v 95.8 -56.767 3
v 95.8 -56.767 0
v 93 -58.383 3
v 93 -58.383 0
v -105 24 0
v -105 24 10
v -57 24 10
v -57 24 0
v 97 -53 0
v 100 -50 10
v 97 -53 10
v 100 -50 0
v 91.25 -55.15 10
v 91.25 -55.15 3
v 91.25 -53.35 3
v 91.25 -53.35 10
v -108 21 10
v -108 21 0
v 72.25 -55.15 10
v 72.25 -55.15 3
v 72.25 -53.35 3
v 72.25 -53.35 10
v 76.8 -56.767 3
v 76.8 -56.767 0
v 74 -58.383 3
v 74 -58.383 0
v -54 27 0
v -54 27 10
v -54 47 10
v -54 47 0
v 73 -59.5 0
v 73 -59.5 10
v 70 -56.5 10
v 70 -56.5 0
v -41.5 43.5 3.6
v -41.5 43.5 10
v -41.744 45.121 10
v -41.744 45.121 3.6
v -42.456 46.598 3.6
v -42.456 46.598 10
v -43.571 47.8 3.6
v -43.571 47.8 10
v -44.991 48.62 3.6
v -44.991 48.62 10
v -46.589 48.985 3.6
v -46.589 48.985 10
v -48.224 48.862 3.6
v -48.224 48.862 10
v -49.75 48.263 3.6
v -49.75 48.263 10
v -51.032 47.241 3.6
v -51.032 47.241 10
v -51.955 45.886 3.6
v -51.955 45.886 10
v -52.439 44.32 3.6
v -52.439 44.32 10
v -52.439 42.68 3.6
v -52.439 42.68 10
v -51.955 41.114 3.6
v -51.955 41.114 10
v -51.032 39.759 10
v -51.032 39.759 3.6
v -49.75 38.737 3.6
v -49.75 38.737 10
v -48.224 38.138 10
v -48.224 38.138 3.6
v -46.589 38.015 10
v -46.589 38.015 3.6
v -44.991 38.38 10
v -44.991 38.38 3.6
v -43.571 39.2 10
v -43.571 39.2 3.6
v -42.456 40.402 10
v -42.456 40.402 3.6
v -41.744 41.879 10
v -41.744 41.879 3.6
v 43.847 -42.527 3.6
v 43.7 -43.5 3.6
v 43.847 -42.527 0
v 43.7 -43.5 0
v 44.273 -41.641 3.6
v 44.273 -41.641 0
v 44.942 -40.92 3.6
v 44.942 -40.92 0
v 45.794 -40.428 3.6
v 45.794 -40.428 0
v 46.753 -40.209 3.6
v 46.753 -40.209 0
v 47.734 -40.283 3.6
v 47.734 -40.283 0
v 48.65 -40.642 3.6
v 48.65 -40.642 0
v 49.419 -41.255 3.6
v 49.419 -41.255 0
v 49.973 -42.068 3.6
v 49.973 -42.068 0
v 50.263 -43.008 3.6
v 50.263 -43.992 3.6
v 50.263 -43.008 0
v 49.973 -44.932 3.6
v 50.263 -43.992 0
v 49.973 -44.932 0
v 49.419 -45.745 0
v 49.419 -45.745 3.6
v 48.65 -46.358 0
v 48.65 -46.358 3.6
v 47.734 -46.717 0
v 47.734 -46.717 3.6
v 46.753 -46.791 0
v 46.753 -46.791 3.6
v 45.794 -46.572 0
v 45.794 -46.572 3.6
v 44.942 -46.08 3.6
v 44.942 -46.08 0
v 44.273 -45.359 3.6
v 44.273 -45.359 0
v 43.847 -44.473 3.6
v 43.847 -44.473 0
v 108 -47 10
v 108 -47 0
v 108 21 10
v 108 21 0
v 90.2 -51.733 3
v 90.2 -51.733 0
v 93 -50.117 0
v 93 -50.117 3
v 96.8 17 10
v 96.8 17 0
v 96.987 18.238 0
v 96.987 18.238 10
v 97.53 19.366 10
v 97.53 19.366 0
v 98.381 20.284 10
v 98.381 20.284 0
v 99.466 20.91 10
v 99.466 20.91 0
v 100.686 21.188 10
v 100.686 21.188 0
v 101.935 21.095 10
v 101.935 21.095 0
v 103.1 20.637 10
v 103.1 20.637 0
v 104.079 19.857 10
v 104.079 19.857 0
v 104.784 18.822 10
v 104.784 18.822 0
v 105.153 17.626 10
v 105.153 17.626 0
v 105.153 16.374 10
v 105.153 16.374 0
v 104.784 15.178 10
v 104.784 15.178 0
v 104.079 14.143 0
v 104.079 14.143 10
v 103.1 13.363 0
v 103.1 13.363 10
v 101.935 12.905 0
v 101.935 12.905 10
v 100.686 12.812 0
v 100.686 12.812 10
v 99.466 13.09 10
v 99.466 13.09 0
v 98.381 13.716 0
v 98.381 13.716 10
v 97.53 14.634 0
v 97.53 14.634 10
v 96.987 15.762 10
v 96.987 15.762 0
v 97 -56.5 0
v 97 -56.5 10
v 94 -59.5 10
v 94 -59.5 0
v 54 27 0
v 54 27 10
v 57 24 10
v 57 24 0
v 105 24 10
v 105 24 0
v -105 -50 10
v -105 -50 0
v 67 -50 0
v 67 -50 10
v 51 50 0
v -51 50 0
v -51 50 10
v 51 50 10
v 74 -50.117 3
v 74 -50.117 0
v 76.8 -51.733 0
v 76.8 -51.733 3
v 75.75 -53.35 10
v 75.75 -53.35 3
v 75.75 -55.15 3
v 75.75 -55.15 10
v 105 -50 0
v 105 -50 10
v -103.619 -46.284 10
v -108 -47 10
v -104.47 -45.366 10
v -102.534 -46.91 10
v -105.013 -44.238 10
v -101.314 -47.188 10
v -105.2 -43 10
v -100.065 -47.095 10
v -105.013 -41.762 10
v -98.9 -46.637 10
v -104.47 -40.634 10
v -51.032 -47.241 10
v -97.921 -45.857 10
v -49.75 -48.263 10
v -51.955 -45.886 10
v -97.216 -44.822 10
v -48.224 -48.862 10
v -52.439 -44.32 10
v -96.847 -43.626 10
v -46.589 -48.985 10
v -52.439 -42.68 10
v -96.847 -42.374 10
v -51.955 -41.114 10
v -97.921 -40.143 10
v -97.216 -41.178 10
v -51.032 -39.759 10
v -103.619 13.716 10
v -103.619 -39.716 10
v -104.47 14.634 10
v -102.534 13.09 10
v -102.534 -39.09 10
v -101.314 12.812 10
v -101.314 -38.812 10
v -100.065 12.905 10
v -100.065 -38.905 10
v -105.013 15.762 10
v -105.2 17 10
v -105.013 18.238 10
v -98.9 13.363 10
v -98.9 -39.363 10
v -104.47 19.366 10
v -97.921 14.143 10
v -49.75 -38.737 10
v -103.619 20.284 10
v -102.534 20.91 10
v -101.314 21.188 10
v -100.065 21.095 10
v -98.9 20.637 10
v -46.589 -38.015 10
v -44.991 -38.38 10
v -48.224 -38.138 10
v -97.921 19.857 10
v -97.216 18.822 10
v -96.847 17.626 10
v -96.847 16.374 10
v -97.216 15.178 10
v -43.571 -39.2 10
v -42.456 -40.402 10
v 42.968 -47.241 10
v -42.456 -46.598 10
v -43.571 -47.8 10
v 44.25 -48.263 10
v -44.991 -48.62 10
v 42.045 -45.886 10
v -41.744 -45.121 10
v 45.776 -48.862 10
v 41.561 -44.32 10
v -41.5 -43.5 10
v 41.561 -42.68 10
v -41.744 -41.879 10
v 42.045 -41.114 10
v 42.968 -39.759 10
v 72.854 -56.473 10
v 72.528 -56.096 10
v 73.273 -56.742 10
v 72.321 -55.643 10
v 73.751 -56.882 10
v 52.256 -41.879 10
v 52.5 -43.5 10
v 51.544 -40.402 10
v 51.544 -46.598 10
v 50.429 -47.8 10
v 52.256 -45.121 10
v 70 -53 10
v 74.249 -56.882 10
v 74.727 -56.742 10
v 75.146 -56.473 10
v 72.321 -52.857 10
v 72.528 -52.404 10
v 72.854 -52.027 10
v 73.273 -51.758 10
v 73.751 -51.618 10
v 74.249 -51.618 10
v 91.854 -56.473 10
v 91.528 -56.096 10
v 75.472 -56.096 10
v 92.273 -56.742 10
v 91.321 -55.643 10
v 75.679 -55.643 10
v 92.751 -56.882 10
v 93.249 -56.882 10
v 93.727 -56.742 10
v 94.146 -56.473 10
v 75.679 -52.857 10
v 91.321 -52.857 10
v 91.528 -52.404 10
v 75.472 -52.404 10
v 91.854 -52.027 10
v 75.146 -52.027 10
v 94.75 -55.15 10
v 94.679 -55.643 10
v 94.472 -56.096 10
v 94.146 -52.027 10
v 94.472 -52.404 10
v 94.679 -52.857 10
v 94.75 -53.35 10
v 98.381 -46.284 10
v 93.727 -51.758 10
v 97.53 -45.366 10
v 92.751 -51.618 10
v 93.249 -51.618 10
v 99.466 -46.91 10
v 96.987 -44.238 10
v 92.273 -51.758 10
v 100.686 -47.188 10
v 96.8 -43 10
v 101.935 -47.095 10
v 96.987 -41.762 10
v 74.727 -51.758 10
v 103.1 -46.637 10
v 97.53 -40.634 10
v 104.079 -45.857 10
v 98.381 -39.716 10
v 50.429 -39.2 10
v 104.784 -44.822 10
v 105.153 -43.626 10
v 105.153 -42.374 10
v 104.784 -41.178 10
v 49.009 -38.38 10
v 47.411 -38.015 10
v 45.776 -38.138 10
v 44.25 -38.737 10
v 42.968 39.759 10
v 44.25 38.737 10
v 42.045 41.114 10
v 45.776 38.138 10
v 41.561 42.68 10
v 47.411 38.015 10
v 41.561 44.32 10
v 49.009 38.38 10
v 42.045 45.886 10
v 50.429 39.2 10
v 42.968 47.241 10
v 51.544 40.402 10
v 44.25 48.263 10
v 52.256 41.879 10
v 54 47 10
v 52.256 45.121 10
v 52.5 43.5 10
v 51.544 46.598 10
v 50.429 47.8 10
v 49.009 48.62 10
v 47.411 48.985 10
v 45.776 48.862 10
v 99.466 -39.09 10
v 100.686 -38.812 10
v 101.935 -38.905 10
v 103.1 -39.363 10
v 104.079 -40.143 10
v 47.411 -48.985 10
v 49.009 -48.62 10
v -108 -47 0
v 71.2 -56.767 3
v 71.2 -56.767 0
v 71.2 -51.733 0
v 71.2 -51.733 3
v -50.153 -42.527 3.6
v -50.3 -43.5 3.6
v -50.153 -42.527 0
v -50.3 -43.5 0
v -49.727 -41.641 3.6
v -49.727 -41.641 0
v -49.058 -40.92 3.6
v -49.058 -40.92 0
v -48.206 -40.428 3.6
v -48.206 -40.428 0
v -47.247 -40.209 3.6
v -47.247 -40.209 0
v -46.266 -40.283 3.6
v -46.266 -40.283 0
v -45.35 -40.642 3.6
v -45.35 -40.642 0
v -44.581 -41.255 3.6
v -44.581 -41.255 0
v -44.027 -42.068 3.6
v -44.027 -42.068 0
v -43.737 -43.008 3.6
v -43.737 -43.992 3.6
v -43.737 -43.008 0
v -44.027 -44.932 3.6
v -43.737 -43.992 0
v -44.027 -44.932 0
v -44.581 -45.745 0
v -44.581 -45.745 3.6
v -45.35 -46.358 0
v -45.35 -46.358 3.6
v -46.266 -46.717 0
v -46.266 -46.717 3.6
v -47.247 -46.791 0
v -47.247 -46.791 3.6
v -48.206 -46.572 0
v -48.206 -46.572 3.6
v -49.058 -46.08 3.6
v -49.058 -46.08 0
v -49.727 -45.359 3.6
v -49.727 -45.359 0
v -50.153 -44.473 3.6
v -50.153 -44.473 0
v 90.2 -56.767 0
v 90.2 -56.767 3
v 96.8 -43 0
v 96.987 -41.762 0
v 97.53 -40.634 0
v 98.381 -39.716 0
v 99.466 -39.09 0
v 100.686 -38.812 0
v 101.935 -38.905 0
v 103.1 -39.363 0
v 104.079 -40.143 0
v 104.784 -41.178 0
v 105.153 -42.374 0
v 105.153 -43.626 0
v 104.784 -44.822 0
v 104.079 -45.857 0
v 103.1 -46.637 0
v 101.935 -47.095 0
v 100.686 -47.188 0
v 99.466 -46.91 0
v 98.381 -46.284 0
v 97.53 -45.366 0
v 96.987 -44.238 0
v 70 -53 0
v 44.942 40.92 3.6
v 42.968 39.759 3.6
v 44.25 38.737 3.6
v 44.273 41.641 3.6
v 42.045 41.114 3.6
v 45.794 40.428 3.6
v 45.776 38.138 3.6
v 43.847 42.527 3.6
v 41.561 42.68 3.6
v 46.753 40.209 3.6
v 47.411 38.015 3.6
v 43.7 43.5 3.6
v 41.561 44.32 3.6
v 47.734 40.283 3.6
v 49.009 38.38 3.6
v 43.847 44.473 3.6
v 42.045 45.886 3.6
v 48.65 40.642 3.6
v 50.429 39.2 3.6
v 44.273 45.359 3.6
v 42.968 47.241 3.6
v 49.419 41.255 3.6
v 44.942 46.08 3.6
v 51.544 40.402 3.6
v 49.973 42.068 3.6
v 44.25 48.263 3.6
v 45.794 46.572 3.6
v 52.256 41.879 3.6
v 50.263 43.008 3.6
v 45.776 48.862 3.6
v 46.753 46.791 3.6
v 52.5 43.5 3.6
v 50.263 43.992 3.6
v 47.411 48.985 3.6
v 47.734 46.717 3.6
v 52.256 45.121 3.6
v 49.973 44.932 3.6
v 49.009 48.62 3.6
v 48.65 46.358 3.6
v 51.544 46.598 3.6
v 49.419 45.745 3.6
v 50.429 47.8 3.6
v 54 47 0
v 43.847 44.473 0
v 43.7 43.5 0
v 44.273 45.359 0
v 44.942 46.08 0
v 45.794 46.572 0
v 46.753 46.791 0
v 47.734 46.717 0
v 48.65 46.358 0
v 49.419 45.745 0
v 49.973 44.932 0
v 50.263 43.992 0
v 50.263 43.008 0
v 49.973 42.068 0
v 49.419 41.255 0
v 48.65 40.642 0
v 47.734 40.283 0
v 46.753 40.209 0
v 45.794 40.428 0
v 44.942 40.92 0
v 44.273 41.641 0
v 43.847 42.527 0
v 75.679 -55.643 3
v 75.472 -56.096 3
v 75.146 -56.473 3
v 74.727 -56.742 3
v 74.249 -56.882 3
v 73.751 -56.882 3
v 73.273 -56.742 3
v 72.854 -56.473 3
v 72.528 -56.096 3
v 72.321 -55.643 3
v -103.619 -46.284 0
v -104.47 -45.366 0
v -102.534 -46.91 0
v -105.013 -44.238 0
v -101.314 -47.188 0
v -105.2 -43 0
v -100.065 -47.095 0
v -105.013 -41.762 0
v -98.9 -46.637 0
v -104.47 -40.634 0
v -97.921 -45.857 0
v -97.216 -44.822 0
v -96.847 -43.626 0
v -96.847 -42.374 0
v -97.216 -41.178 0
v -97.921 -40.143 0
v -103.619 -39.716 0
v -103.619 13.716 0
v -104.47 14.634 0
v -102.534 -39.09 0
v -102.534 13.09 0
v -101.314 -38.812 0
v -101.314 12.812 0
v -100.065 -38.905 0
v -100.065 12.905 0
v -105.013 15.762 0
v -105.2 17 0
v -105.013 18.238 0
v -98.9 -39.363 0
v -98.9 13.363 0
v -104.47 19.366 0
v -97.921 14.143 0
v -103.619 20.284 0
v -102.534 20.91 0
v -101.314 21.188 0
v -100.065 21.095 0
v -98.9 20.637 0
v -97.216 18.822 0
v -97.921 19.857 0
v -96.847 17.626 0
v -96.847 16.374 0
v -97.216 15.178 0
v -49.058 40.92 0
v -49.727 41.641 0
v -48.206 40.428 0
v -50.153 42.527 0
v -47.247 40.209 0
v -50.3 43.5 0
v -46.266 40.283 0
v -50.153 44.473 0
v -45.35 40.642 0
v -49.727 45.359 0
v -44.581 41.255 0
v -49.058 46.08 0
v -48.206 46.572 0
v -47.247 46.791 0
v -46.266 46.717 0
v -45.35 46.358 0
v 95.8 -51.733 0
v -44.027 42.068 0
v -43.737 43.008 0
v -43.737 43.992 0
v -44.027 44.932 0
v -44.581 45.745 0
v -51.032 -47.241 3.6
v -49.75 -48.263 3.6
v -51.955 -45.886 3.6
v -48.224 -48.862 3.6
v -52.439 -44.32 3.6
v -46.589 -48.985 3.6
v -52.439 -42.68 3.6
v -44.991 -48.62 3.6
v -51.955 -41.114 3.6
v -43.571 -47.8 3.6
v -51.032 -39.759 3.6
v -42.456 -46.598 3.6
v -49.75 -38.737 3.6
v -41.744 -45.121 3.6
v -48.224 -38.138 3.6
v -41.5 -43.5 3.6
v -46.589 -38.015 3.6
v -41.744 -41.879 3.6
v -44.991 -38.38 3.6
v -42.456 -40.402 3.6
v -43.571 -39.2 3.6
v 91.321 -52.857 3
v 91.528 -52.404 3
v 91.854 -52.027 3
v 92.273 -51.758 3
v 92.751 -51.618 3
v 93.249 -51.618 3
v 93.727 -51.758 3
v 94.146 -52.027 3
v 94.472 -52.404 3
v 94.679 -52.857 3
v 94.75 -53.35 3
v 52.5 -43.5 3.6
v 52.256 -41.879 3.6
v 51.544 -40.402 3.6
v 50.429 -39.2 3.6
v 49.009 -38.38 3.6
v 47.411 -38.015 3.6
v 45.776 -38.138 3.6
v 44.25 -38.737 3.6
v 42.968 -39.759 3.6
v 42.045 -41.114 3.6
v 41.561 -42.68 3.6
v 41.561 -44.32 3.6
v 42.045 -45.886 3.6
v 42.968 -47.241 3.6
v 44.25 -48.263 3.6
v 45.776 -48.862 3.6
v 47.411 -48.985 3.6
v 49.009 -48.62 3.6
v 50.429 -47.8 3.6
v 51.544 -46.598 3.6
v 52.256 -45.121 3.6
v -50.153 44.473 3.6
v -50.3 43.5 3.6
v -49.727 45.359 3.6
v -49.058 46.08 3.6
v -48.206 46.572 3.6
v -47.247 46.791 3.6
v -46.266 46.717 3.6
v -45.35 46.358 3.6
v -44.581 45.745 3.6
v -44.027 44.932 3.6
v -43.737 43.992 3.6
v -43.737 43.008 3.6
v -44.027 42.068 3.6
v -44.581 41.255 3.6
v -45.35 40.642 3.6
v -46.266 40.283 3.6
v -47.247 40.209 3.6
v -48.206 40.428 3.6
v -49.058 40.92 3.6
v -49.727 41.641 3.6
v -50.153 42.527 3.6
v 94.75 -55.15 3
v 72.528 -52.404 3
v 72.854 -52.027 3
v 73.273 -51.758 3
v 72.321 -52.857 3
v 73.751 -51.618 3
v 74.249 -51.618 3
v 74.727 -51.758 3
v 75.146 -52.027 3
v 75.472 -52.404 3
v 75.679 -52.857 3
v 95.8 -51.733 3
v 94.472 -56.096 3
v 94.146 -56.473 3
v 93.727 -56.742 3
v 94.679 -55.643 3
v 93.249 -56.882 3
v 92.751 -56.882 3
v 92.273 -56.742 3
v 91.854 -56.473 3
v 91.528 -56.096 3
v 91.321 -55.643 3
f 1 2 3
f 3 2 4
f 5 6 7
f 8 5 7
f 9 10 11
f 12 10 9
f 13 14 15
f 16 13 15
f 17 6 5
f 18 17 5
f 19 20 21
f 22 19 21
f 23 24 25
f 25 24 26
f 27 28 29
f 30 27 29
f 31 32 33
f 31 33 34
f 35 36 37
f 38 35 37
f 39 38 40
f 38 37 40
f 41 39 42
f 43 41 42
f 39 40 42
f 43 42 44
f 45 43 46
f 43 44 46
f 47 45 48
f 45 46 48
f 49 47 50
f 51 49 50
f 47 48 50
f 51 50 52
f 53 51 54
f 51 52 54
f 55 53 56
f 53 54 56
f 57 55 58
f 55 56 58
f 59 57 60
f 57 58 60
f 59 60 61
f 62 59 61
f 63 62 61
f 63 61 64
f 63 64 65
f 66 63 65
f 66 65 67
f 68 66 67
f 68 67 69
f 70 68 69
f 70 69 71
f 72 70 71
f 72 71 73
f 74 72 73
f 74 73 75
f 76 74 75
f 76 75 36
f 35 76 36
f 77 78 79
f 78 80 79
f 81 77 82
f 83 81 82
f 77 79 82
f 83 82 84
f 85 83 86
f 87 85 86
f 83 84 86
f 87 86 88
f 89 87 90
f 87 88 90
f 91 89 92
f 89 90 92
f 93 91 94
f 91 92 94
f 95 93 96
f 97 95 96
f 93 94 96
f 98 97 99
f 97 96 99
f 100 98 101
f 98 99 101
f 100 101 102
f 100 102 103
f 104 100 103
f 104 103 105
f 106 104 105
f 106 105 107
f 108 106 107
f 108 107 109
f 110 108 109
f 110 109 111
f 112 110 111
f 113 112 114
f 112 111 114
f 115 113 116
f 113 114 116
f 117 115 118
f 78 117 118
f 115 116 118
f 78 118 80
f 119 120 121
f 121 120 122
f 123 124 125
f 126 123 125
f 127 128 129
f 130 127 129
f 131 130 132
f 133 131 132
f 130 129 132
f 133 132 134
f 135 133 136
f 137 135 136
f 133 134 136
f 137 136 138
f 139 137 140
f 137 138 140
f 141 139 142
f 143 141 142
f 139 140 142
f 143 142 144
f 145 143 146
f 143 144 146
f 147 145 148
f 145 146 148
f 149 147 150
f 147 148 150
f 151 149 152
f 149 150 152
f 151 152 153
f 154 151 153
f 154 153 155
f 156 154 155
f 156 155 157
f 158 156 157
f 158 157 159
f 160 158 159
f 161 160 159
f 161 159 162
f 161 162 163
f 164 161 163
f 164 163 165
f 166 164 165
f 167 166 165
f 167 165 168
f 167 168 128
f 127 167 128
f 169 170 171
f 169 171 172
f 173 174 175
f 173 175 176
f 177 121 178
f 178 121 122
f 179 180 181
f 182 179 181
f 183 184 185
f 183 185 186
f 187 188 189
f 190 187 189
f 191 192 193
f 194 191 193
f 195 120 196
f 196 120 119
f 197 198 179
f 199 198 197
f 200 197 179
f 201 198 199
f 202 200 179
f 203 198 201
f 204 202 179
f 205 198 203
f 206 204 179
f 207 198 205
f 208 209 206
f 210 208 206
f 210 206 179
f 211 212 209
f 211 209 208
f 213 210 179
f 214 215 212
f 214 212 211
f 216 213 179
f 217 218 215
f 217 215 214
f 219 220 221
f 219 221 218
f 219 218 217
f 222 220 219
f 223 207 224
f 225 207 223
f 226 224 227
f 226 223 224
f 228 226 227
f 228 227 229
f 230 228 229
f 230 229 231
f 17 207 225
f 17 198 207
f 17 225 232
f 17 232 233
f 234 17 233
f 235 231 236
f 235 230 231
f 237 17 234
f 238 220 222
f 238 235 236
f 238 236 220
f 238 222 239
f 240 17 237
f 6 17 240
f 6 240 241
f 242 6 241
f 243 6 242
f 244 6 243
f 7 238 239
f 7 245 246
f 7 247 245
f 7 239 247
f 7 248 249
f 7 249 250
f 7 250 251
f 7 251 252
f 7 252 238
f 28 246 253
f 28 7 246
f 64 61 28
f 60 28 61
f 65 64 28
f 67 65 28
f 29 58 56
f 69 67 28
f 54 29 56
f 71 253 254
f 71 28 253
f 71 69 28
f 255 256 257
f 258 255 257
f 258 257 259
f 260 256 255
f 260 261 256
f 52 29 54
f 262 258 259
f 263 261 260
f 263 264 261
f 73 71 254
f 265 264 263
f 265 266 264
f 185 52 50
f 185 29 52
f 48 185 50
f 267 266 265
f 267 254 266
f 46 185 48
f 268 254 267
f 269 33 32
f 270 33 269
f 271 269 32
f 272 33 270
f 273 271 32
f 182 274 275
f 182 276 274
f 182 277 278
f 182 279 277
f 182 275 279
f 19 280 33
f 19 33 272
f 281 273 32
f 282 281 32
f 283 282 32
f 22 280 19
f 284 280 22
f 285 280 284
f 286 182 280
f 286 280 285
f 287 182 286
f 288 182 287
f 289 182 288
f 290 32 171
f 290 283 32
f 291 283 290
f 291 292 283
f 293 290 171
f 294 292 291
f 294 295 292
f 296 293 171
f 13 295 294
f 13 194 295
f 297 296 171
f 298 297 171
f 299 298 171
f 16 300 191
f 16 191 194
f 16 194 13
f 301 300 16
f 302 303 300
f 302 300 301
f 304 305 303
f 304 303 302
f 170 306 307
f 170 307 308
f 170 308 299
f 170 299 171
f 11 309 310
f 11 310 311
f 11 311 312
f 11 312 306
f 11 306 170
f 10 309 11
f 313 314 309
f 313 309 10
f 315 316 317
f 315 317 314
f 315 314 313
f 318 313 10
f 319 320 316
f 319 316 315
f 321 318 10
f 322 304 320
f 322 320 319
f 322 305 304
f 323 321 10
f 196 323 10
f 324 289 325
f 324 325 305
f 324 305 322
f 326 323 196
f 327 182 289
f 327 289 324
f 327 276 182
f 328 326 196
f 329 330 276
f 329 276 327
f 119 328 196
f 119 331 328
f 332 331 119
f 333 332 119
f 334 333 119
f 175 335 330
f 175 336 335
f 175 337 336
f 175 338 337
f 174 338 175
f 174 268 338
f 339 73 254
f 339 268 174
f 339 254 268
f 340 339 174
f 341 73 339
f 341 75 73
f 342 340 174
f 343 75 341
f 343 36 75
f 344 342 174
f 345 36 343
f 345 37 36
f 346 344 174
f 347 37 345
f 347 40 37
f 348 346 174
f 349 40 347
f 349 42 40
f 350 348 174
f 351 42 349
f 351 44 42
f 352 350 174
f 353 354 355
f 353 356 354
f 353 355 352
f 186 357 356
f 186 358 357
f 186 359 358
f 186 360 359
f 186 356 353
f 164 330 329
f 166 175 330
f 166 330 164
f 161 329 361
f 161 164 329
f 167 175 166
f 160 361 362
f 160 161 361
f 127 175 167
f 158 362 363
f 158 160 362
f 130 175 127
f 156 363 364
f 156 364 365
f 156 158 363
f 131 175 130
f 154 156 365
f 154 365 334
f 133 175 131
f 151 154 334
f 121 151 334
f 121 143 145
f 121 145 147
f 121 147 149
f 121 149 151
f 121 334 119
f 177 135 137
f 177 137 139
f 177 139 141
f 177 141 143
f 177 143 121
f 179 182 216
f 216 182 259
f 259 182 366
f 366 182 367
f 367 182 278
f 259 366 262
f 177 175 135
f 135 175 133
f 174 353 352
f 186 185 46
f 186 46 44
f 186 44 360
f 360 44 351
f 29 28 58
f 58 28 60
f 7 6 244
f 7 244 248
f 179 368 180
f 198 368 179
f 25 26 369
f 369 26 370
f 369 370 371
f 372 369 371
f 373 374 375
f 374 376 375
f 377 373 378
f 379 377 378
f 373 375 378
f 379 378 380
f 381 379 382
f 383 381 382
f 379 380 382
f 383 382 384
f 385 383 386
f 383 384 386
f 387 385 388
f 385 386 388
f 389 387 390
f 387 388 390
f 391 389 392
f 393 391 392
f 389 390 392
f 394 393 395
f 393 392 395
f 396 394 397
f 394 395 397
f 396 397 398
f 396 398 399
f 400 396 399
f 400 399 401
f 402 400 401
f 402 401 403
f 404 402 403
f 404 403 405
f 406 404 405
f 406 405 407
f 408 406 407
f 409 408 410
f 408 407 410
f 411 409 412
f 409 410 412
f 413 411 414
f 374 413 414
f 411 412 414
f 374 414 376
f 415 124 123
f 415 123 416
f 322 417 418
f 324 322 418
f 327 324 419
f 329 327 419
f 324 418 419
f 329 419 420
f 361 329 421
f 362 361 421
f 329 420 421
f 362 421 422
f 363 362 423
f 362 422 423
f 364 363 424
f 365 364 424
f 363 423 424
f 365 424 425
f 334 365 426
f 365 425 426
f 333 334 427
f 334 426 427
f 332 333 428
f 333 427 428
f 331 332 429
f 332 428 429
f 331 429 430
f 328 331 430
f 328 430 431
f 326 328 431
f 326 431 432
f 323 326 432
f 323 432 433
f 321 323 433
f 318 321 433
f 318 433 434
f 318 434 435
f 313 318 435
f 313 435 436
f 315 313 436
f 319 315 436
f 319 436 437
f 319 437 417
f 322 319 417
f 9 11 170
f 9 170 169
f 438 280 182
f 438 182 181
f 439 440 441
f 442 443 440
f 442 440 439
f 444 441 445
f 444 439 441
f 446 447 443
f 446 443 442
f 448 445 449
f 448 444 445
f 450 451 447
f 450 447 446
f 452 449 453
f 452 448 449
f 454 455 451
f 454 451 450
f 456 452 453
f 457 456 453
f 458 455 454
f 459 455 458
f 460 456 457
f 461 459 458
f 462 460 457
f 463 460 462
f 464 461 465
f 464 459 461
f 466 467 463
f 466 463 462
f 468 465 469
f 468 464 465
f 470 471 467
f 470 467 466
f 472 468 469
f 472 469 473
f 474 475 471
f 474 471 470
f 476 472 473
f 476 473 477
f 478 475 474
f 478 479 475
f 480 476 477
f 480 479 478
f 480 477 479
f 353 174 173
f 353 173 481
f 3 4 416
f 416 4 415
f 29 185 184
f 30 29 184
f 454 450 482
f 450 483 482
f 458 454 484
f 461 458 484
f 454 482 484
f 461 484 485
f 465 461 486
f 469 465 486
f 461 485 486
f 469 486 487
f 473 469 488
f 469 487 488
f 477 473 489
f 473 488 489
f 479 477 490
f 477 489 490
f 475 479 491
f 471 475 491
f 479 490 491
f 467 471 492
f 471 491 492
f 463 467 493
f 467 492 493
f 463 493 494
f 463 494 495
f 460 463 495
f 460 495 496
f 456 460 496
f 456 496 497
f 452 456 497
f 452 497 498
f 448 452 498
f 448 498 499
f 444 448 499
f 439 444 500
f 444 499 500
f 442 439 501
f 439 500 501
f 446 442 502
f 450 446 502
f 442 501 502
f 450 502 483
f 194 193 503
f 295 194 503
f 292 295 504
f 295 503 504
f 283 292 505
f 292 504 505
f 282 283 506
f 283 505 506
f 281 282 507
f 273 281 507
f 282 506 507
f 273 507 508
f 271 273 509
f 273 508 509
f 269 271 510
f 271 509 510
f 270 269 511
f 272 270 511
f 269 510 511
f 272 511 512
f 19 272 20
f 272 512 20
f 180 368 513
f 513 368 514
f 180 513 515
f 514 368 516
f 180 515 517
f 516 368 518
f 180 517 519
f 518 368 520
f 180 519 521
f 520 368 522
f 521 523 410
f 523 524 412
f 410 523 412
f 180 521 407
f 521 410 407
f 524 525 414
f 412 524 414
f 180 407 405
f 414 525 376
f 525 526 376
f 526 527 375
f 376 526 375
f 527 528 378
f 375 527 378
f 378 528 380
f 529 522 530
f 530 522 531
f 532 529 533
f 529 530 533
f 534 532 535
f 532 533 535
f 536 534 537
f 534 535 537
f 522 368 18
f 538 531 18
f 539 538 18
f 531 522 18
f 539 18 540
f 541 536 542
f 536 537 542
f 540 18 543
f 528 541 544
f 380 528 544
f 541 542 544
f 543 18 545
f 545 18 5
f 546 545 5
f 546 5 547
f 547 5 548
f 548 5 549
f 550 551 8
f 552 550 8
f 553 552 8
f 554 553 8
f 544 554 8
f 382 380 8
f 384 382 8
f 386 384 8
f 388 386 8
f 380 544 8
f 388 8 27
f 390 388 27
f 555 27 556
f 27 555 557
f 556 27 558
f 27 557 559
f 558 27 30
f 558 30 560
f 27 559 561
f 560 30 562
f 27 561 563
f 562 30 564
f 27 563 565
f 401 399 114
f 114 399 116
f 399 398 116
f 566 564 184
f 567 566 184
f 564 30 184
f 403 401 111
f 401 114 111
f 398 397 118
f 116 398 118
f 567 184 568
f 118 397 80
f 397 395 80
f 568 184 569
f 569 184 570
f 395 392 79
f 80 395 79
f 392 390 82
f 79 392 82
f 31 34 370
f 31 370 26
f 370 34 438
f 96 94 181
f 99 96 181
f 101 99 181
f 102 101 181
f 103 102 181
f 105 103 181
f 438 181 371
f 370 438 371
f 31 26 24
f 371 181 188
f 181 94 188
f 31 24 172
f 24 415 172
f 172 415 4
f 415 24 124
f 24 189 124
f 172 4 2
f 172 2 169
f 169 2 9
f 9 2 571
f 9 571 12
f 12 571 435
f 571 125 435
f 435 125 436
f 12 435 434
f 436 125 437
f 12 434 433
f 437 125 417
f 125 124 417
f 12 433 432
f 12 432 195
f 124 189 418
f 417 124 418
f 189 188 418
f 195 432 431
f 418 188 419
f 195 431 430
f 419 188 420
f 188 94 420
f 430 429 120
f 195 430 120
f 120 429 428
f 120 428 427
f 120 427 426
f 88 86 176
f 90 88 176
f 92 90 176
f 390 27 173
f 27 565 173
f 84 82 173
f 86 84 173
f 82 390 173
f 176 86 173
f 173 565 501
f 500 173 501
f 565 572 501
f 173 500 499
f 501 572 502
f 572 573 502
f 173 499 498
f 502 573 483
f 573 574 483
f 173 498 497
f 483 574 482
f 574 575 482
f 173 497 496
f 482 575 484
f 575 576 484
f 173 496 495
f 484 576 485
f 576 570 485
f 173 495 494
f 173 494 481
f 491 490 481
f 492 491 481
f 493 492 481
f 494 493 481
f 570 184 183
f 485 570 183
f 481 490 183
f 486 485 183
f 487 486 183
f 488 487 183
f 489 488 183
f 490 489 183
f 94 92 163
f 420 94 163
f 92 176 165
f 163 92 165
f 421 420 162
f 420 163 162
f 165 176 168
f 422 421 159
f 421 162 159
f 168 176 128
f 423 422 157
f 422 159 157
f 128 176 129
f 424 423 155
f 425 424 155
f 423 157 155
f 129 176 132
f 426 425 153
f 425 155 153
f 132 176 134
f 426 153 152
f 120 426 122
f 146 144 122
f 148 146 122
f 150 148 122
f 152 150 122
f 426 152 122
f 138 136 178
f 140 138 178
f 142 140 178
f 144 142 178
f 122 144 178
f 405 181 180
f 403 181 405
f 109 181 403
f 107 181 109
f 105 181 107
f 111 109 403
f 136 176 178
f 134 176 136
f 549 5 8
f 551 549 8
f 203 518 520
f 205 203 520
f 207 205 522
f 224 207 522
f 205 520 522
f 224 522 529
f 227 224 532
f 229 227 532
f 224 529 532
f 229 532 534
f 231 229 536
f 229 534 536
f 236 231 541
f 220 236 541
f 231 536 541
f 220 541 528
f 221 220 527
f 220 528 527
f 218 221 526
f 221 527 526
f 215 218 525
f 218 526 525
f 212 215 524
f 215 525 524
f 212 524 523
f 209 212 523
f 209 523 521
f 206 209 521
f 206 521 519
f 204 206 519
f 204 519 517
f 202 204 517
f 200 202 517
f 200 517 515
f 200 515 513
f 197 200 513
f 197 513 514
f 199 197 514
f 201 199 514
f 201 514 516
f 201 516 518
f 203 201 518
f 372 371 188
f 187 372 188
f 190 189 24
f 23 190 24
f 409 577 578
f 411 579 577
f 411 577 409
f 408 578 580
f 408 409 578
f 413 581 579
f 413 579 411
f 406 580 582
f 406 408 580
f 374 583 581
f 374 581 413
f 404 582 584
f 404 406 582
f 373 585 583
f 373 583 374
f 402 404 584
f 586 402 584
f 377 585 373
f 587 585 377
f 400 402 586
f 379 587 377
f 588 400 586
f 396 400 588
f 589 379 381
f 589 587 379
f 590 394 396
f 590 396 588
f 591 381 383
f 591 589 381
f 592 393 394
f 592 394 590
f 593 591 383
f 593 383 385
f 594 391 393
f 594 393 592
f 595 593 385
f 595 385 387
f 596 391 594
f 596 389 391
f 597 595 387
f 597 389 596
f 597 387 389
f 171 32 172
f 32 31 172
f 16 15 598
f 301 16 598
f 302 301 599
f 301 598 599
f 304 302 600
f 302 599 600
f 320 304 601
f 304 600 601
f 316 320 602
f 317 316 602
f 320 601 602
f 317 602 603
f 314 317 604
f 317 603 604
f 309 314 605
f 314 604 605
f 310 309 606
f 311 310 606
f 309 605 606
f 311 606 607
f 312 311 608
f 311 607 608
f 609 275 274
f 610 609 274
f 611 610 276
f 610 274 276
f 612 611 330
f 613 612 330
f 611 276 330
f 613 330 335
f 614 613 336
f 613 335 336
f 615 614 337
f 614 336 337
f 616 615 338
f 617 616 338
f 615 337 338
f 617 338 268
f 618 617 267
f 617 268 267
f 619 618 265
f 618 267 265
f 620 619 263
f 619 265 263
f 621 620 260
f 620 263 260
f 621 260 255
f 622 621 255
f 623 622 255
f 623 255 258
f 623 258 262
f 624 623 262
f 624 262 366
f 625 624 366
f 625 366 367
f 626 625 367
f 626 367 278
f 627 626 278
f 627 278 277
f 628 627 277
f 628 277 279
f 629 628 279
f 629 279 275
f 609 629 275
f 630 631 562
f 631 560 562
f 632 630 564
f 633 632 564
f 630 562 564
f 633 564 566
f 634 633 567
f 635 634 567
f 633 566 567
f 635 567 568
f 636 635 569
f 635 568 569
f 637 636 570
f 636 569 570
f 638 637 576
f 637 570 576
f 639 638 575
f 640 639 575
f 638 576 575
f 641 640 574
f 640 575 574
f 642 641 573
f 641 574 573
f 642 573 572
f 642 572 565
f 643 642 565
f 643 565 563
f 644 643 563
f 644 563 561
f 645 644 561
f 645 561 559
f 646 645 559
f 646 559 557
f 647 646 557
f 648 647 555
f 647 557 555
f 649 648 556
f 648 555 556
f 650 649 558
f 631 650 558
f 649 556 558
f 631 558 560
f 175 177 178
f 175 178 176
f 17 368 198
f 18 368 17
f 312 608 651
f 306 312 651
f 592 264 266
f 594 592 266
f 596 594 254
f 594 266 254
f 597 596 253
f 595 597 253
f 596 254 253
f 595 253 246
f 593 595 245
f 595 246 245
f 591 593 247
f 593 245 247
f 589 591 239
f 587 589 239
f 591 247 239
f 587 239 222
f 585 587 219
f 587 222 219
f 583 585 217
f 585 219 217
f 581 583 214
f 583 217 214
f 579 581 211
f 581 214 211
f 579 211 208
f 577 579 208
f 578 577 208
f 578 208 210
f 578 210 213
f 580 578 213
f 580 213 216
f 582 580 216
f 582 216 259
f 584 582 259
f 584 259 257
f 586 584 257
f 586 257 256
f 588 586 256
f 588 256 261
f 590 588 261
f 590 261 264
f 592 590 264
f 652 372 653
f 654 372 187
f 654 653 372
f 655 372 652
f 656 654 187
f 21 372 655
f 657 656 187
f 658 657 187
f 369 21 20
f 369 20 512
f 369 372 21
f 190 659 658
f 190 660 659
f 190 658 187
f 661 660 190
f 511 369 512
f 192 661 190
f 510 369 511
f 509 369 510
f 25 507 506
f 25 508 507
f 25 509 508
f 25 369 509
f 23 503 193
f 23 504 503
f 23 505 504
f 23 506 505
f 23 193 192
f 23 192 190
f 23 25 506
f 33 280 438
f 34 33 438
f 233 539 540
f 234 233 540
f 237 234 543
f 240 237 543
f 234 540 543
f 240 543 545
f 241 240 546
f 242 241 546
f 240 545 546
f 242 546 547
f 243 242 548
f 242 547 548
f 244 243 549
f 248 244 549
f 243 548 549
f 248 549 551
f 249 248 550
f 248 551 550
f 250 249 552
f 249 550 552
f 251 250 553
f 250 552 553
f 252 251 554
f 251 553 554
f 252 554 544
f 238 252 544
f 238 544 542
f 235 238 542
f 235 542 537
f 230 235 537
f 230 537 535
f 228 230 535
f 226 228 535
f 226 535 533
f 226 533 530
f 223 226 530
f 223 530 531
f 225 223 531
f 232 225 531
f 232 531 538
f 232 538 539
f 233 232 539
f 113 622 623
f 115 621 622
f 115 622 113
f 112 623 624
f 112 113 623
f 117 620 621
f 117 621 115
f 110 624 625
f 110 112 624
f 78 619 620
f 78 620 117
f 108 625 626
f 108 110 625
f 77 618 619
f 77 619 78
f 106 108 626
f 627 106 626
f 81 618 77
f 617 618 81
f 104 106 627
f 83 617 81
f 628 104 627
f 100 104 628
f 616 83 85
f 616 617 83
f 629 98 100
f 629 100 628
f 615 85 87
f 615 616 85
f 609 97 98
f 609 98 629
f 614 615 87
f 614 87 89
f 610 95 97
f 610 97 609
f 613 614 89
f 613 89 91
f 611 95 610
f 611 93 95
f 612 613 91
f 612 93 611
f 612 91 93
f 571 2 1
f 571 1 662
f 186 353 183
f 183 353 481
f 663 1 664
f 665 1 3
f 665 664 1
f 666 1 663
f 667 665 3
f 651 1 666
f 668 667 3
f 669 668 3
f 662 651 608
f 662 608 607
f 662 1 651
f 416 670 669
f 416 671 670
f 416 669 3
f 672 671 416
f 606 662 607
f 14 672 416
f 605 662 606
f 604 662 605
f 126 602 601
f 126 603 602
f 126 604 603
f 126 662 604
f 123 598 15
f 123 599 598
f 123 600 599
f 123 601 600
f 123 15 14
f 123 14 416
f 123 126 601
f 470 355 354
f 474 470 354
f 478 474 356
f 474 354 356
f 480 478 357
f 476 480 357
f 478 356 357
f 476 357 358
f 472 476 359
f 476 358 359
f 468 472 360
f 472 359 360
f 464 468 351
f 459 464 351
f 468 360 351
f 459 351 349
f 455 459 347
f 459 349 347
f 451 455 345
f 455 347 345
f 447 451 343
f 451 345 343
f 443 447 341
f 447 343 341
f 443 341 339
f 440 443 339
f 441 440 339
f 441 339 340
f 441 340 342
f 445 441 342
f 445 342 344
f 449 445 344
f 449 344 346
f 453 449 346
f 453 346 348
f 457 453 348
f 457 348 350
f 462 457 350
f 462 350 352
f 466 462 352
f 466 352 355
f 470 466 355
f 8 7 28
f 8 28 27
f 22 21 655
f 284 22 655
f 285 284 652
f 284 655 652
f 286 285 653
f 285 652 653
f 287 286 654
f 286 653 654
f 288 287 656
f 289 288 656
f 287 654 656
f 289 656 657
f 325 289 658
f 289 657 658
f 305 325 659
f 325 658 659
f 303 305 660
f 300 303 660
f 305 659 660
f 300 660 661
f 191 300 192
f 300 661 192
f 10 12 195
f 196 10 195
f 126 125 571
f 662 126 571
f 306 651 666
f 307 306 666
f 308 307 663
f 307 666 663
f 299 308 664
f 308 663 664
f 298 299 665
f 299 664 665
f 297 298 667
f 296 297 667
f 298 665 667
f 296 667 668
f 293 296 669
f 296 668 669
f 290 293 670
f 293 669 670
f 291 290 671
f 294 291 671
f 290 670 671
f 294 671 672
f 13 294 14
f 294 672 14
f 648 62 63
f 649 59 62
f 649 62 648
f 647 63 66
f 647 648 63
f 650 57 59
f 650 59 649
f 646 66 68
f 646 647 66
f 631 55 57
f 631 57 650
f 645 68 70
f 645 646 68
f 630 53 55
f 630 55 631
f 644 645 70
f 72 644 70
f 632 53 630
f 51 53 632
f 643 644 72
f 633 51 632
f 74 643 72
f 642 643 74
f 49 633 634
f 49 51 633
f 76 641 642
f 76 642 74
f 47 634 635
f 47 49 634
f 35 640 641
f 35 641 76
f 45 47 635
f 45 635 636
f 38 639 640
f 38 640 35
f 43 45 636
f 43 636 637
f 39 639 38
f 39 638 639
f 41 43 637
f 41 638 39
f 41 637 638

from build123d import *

# Parameters (mm, degrees)
SKIZZE1_W                                            = 216
SKIZZE1_H                                            = 100
AUFSATZ_LINEAR_AUSTRAGEN1_DEPTH                      = 10
STIRNSENKUNG_F_R_M6_ZYLINDERSCHRAUBE_MIT_D           = 6.6
STIRNSENKUNG_F_R_M6_ZYLINDERSCHRAUBE_MIT_DEPTH       = 15
STIRNSENKUNG_F_R_M6_ZYLINDERSCHRAUBE_MIT_CBORE_D     = 11
STIRNSENKUNG_F_R_M6_ZYLINDERSCHRAUBE_MIT_CBORE_DEPTH = 6.4
STIRNSENKUNG_F_R_M6_ZYLINDERSCHRAUBE_MIT_TIP         = 1.982840043
CBORE_FOR_M6_HEX_SOCKET_HEAD_CAP_SCREW1_D            = 6.6
CBORE_FOR_M6_HEX_SOCKET_HEAD_CAP_SCREW1_DEPTH        = 15
CBORE_FOR_M6_HEX_SOCKET_HEAD_CAP_SCREW1_CBORE_D      = 11
CBORE_FOR_M6_HEX_SOCKET_HEAD_CAP_SCREW1_CBORE_DEPTH  = 6.4
CBORE_FOR_M6_HEX_SOCKET_HEAD_CAP_SCREW1_TIP          = 1.982840043
M8_CLEARANCE_HOLE1_D                                 = 8.4
M8_CLEARANCE_HOLE1_DEPTH                             = 17
M8_CLEARANCE_HOLE1_TIP                               = 2.5236146
SKIZZE18_W                                           = 54
SKIZZE18_H                                           = 26
SCHNITT_LINEAR_AUSTRAGEN1_DEPTH                      = 15
SKETCH1_W                                            = 27
SKETCH1_H                                            = 10
BOSS_EXTRUDE1_DEPTH                                  = 9.5
CUT_EXTRUDE1_DEPTH                                   = 10
LPATTERN1_COUNT                                      = 2
LPATTERN1_PITCH                                      = 19
CUT_EXTRUDE2_START                                   = -10
CUT_EXTRUDE2_DEPTH                                   = 3
LPATTERN2_COUNT                                      = 2
LPATTERN2_PITCH                                      = 19
MIRROR1_COPY_1_DEPTH                                 = 10
MIRROR1_START                                        = -10
MIRROR1_COPY_2_DEPTH                                 = 3
SKETCH5_W                                            = 27
SKETCH5_H                                            = 9.5
CUT_EXTRUDE3_DEPTH                                   = 10
CHAMFER4_SIZE                                        = 3
CHAMFER5_SIZE                                        = 3


with BuildPart() as part:
    # Skizze1 → Aufsatz-Linear austragen1 (new body)
    with BuildSketch(Plane.XY):
        Rectangle(SKIZZE1_W, SKIZZE1_H)
    extrude(amount=AUFSATZ_LINEAR_AUSTRAGEN1_DEPTH)

    # Stirnsenkung für M6 Zylinderschraube mit Innensechskant1
    with Locations(Plane.XY.offset(10)):
        with Locations((-47, -43.5), (47, -43.5)):
            CounterBoreHole(STIRNSENKUNG_F_R_M6_ZYLINDERSCHRAUBE_MIT_D / 2, STIRNSENKUNG_F_R_M6_ZYLINDERSCHRAUBE_MIT_CBORE_D / 2, STIRNSENKUNG_F_R_M6_ZYLINDERSCHRAUBE_MIT_CBORE_DEPTH, depth=STIRNSENKUNG_F_R_M6_ZYLINDERSCHRAUBE_MIT_DEPTH)
            with Locations((0, 0, -(STIRNSENKUNG_F_R_M6_ZYLINDERSCHRAUBE_MIT_DEPTH + STIRNSENKUNG_F_R_M6_ZYLINDERSCHRAUBE_MIT_TIP / 2))):  # 118° drill point
                Cone(0, STIRNSENKUNG_F_R_M6_ZYLINDERSCHRAUBE_MIT_D / 2, STIRNSENKUNG_F_R_M6_ZYLINDERSCHRAUBE_MIT_TIP, mode=Mode.SUBTRACT)

    # CBORE for M6 Hex Socket Head Cap Screw1
    with Locations(Plane.XY.offset(10)):
        with Locations((-47, 43.5), (47, 43.5)):
            CounterBoreHole(CBORE_FOR_M6_HEX_SOCKET_HEAD_CAP_SCREW1_D / 2, CBORE_FOR_M6_HEX_SOCKET_HEAD_CAP_SCREW1_CBORE_D / 2, CBORE_FOR_M6_HEX_SOCKET_HEAD_CAP_SCREW1_CBORE_DEPTH, depth=CBORE_FOR_M6_HEX_SOCKET_HEAD_CAP_SCREW1_DEPTH)
            with Locations((0, 0, -(CBORE_FOR_M6_HEX_SOCKET_HEAD_CAP_SCREW1_DEPTH + CBORE_FOR_M6_HEX_SOCKET_HEAD_CAP_SCREW1_TIP / 2))):  # 118° drill point
                Cone(0, CBORE_FOR_M6_HEX_SOCKET_HEAD_CAP_SCREW1_D / 2, CBORE_FOR_M6_HEX_SOCKET_HEAD_CAP_SCREW1_TIP, mode=Mode.SUBTRACT)

    # M8 Clearance Hole1
    with Locations(Plane.XY.offset(10)):
        with Locations((-101, 17), (-101, -43), (101, 17), (101, -43)):
            Hole(M8_CLEARANCE_HOLE1_D / 2, depth=M8_CLEARANCE_HOLE1_DEPTH)
            with Locations((0, 0, -(M8_CLEARANCE_HOLE1_DEPTH + M8_CLEARANCE_HOLE1_TIP / 2))):  # 118° drill point
                Cone(0, M8_CLEARANCE_HOLE1_D / 2, M8_CLEARANCE_HOLE1_TIP, mode=Mode.SUBTRACT)

    # Skizze18 → Schnitt-Linear austragen1 (cut)
    with BuildSketch(Plane.XY.offset(10)):
        with Locations((-81, 37)):
            Rectangle(SKIZZE18_W, SKIZZE18_H)
    schnitt_linear_austragen1 = extrude(amount=-SCHNITT_LINEAR_AUSTRAGEN1_DEPTH, mode=Mode.SUBTRACT)

    # Spiegeln1: Schnitt-Linear austragen1 across plane
    add(schnitt_linear_austragen1.mirror(Plane(origin=(0, 0, 0), x_dir=(0, 0, 1), z_dir=(1, 0, 0))), mode=Mode.SUBTRACT)

    # Sketch1 → Boss-Extrude1 (add)
    with BuildSketch(Plane(origin=(0, 24, 0), x_dir=(1, 0, 0), z_dir=(0, 1, 0))):
        with Locations((83.5, -5)):
            Rectangle(SKETCH1_W, SKETCH1_H)
    boss_extrude1 = extrude(amount=BOSS_EXTRUDE1_DEPTH)

    # Sketch3 → Cut-Extrude1 (cut)
    with BuildSketch(Plane(origin=(0, 0, 0), x_dir=(-1, 0, 0), z_dir=(0, 0, -1))):
        with BuildLine():
            Line((-91.25, 29.15), (-91.25, 27.35))
            ThreePointArc((-91.25, 27.35), (-93, 25.6), (-94.75, 27.35))
            Line((-94.75, 27.35), (-94.75, 29.15))
            ThreePointArc((-94.75, 29.15), (-93, 30.9), (-91.25, 29.15))
        make_face()
    cut_extrude1 = extrude(amount=-CUT_EXTRUDE1_DEPTH, mode=Mode.SUBTRACT)

    # LPattern1: Cut-Extrude1 ×2
    with Locations(*[(-i * LPATTERN1_PITCH, 0, 0) for i in range(1, LPATTERN1_COUNT)]):
        add(cut_extrude1, mode=Mode.SUBTRACT)

    # Sketch4 → Cut-Extrude2 (cut)
    with BuildSketch(Plane.XY.offset(10).offset(CUT_EXTRUDE2_START)):
        Polygon((74, 32.383161507), (71.2, 30.766580754), (71.2, 28.375279034), (71.2, 25.733419246), (74, 24.116838493), (76.8, 25.733419246), (76.8, 28.372780006), (76.8, 30.766580754), align=None)
    cut_extrude2 = extrude(amount=CUT_EXTRUDE2_DEPTH, mode=Mode.SUBTRACT)

    # LPattern2: Cut-Extrude2 ×2
    with Locations(*[(i * LPATTERN2_PITCH, 0, 0) for i in range(1, LPATTERN2_COUNT)]):
        add(cut_extrude2, mode=Mode.SUBTRACT)

    # Mirror1: Boss-Extrude1, Cut-Extrude1, Cut-Extrude2 across plane
    add(boss_extrude1.mirror(Plane.ZX.offset(-13)))
    add(cut_extrude1.mirror(Plane.ZX.offset(-13)), mode=Mode.SUBTRACT)
    add(cut_extrude2.mirror(Plane.ZX.offset(-13)), mode=Mode.SUBTRACT)

    # Mirror1 copy 1 sketch → Mirror1 copy 1 (cut)
    with BuildSketch(Plane(origin=(-19, -26, 0), x_dir=(-1, 0, 0), z_dir=(0, 0, -1))):
        with BuildLine():
            Line((-91.25, -29.15), (-91.25, -27.35))
            ThreePointArc((-91.25, -27.35), (-93, -25.6), (-94.75, -27.35))
            Line((-94.75, -27.35), (-94.75, -29.15))
            ThreePointArc((-94.75, -29.15), (-93, -30.9), (-91.25, -29.15))
        make_face()
    extrude(amount=-MIRROR1_COPY_1_DEPTH, mode=Mode.SUBTRACT)

    # Mirror1 copy 2 sketch → Mirror1 copy 2 (cut)
    with BuildSketch(Plane(origin=(19, -26, 10), x_dir=(1, 0, 0), z_dir=(0, 0, 1)).offset(MIRROR1_START)):
        Polygon((74, -32.383161507), (71.2, -30.766580754), (71.2, -28.375279034), (71.2, -25.733419246), (74, -24.116838493), (76.8, -25.733419246), (76.8, -28.372780006), (76.8, -30.766580754), align=None)
    extrude(amount=MIRROR1_COPY_2_DEPTH, mode=Mode.SUBTRACT)

    # Sketch5 → Cut-Extrude3 (cut)
    with BuildSketch(Plane.XY.offset(10)):
        with Locations((83.5, 28.75)):
            Rectangle(SKETCH5_W, SKETCH5_H)
    extrude(amount=-CUT_EXTRUDE3_DEPTH, mode=Mode.SUBTRACT)

    # Chamfer4
    chamfer4_edges = [part.edges().sort_by_distance(p)[0] for p in [
        (97, -59.5, 5),
        (70, -59.5, 5),
        (97, -50, 5),
        (70, -50, 5),
        (-54, 24, 5),
        (54, 24, 5),
    ]]
    chamfer(chamfer4_edges, length=CHAMFER4_SIZE)

    # Chamfer5
    chamfer5_edges = [part.edges().sort_by_distance(p)[0] for p in [
        (108, -50, 5),
        (-108, 24, 5),
        (-108, -50, 5),
        (-54, 50, 5),
        (108, 24, 5),
        (54, 50, 5),
    ]]
    chamfer(chamfer5_edges, length=CHAMFER5_SIZE)


solid = part.part
